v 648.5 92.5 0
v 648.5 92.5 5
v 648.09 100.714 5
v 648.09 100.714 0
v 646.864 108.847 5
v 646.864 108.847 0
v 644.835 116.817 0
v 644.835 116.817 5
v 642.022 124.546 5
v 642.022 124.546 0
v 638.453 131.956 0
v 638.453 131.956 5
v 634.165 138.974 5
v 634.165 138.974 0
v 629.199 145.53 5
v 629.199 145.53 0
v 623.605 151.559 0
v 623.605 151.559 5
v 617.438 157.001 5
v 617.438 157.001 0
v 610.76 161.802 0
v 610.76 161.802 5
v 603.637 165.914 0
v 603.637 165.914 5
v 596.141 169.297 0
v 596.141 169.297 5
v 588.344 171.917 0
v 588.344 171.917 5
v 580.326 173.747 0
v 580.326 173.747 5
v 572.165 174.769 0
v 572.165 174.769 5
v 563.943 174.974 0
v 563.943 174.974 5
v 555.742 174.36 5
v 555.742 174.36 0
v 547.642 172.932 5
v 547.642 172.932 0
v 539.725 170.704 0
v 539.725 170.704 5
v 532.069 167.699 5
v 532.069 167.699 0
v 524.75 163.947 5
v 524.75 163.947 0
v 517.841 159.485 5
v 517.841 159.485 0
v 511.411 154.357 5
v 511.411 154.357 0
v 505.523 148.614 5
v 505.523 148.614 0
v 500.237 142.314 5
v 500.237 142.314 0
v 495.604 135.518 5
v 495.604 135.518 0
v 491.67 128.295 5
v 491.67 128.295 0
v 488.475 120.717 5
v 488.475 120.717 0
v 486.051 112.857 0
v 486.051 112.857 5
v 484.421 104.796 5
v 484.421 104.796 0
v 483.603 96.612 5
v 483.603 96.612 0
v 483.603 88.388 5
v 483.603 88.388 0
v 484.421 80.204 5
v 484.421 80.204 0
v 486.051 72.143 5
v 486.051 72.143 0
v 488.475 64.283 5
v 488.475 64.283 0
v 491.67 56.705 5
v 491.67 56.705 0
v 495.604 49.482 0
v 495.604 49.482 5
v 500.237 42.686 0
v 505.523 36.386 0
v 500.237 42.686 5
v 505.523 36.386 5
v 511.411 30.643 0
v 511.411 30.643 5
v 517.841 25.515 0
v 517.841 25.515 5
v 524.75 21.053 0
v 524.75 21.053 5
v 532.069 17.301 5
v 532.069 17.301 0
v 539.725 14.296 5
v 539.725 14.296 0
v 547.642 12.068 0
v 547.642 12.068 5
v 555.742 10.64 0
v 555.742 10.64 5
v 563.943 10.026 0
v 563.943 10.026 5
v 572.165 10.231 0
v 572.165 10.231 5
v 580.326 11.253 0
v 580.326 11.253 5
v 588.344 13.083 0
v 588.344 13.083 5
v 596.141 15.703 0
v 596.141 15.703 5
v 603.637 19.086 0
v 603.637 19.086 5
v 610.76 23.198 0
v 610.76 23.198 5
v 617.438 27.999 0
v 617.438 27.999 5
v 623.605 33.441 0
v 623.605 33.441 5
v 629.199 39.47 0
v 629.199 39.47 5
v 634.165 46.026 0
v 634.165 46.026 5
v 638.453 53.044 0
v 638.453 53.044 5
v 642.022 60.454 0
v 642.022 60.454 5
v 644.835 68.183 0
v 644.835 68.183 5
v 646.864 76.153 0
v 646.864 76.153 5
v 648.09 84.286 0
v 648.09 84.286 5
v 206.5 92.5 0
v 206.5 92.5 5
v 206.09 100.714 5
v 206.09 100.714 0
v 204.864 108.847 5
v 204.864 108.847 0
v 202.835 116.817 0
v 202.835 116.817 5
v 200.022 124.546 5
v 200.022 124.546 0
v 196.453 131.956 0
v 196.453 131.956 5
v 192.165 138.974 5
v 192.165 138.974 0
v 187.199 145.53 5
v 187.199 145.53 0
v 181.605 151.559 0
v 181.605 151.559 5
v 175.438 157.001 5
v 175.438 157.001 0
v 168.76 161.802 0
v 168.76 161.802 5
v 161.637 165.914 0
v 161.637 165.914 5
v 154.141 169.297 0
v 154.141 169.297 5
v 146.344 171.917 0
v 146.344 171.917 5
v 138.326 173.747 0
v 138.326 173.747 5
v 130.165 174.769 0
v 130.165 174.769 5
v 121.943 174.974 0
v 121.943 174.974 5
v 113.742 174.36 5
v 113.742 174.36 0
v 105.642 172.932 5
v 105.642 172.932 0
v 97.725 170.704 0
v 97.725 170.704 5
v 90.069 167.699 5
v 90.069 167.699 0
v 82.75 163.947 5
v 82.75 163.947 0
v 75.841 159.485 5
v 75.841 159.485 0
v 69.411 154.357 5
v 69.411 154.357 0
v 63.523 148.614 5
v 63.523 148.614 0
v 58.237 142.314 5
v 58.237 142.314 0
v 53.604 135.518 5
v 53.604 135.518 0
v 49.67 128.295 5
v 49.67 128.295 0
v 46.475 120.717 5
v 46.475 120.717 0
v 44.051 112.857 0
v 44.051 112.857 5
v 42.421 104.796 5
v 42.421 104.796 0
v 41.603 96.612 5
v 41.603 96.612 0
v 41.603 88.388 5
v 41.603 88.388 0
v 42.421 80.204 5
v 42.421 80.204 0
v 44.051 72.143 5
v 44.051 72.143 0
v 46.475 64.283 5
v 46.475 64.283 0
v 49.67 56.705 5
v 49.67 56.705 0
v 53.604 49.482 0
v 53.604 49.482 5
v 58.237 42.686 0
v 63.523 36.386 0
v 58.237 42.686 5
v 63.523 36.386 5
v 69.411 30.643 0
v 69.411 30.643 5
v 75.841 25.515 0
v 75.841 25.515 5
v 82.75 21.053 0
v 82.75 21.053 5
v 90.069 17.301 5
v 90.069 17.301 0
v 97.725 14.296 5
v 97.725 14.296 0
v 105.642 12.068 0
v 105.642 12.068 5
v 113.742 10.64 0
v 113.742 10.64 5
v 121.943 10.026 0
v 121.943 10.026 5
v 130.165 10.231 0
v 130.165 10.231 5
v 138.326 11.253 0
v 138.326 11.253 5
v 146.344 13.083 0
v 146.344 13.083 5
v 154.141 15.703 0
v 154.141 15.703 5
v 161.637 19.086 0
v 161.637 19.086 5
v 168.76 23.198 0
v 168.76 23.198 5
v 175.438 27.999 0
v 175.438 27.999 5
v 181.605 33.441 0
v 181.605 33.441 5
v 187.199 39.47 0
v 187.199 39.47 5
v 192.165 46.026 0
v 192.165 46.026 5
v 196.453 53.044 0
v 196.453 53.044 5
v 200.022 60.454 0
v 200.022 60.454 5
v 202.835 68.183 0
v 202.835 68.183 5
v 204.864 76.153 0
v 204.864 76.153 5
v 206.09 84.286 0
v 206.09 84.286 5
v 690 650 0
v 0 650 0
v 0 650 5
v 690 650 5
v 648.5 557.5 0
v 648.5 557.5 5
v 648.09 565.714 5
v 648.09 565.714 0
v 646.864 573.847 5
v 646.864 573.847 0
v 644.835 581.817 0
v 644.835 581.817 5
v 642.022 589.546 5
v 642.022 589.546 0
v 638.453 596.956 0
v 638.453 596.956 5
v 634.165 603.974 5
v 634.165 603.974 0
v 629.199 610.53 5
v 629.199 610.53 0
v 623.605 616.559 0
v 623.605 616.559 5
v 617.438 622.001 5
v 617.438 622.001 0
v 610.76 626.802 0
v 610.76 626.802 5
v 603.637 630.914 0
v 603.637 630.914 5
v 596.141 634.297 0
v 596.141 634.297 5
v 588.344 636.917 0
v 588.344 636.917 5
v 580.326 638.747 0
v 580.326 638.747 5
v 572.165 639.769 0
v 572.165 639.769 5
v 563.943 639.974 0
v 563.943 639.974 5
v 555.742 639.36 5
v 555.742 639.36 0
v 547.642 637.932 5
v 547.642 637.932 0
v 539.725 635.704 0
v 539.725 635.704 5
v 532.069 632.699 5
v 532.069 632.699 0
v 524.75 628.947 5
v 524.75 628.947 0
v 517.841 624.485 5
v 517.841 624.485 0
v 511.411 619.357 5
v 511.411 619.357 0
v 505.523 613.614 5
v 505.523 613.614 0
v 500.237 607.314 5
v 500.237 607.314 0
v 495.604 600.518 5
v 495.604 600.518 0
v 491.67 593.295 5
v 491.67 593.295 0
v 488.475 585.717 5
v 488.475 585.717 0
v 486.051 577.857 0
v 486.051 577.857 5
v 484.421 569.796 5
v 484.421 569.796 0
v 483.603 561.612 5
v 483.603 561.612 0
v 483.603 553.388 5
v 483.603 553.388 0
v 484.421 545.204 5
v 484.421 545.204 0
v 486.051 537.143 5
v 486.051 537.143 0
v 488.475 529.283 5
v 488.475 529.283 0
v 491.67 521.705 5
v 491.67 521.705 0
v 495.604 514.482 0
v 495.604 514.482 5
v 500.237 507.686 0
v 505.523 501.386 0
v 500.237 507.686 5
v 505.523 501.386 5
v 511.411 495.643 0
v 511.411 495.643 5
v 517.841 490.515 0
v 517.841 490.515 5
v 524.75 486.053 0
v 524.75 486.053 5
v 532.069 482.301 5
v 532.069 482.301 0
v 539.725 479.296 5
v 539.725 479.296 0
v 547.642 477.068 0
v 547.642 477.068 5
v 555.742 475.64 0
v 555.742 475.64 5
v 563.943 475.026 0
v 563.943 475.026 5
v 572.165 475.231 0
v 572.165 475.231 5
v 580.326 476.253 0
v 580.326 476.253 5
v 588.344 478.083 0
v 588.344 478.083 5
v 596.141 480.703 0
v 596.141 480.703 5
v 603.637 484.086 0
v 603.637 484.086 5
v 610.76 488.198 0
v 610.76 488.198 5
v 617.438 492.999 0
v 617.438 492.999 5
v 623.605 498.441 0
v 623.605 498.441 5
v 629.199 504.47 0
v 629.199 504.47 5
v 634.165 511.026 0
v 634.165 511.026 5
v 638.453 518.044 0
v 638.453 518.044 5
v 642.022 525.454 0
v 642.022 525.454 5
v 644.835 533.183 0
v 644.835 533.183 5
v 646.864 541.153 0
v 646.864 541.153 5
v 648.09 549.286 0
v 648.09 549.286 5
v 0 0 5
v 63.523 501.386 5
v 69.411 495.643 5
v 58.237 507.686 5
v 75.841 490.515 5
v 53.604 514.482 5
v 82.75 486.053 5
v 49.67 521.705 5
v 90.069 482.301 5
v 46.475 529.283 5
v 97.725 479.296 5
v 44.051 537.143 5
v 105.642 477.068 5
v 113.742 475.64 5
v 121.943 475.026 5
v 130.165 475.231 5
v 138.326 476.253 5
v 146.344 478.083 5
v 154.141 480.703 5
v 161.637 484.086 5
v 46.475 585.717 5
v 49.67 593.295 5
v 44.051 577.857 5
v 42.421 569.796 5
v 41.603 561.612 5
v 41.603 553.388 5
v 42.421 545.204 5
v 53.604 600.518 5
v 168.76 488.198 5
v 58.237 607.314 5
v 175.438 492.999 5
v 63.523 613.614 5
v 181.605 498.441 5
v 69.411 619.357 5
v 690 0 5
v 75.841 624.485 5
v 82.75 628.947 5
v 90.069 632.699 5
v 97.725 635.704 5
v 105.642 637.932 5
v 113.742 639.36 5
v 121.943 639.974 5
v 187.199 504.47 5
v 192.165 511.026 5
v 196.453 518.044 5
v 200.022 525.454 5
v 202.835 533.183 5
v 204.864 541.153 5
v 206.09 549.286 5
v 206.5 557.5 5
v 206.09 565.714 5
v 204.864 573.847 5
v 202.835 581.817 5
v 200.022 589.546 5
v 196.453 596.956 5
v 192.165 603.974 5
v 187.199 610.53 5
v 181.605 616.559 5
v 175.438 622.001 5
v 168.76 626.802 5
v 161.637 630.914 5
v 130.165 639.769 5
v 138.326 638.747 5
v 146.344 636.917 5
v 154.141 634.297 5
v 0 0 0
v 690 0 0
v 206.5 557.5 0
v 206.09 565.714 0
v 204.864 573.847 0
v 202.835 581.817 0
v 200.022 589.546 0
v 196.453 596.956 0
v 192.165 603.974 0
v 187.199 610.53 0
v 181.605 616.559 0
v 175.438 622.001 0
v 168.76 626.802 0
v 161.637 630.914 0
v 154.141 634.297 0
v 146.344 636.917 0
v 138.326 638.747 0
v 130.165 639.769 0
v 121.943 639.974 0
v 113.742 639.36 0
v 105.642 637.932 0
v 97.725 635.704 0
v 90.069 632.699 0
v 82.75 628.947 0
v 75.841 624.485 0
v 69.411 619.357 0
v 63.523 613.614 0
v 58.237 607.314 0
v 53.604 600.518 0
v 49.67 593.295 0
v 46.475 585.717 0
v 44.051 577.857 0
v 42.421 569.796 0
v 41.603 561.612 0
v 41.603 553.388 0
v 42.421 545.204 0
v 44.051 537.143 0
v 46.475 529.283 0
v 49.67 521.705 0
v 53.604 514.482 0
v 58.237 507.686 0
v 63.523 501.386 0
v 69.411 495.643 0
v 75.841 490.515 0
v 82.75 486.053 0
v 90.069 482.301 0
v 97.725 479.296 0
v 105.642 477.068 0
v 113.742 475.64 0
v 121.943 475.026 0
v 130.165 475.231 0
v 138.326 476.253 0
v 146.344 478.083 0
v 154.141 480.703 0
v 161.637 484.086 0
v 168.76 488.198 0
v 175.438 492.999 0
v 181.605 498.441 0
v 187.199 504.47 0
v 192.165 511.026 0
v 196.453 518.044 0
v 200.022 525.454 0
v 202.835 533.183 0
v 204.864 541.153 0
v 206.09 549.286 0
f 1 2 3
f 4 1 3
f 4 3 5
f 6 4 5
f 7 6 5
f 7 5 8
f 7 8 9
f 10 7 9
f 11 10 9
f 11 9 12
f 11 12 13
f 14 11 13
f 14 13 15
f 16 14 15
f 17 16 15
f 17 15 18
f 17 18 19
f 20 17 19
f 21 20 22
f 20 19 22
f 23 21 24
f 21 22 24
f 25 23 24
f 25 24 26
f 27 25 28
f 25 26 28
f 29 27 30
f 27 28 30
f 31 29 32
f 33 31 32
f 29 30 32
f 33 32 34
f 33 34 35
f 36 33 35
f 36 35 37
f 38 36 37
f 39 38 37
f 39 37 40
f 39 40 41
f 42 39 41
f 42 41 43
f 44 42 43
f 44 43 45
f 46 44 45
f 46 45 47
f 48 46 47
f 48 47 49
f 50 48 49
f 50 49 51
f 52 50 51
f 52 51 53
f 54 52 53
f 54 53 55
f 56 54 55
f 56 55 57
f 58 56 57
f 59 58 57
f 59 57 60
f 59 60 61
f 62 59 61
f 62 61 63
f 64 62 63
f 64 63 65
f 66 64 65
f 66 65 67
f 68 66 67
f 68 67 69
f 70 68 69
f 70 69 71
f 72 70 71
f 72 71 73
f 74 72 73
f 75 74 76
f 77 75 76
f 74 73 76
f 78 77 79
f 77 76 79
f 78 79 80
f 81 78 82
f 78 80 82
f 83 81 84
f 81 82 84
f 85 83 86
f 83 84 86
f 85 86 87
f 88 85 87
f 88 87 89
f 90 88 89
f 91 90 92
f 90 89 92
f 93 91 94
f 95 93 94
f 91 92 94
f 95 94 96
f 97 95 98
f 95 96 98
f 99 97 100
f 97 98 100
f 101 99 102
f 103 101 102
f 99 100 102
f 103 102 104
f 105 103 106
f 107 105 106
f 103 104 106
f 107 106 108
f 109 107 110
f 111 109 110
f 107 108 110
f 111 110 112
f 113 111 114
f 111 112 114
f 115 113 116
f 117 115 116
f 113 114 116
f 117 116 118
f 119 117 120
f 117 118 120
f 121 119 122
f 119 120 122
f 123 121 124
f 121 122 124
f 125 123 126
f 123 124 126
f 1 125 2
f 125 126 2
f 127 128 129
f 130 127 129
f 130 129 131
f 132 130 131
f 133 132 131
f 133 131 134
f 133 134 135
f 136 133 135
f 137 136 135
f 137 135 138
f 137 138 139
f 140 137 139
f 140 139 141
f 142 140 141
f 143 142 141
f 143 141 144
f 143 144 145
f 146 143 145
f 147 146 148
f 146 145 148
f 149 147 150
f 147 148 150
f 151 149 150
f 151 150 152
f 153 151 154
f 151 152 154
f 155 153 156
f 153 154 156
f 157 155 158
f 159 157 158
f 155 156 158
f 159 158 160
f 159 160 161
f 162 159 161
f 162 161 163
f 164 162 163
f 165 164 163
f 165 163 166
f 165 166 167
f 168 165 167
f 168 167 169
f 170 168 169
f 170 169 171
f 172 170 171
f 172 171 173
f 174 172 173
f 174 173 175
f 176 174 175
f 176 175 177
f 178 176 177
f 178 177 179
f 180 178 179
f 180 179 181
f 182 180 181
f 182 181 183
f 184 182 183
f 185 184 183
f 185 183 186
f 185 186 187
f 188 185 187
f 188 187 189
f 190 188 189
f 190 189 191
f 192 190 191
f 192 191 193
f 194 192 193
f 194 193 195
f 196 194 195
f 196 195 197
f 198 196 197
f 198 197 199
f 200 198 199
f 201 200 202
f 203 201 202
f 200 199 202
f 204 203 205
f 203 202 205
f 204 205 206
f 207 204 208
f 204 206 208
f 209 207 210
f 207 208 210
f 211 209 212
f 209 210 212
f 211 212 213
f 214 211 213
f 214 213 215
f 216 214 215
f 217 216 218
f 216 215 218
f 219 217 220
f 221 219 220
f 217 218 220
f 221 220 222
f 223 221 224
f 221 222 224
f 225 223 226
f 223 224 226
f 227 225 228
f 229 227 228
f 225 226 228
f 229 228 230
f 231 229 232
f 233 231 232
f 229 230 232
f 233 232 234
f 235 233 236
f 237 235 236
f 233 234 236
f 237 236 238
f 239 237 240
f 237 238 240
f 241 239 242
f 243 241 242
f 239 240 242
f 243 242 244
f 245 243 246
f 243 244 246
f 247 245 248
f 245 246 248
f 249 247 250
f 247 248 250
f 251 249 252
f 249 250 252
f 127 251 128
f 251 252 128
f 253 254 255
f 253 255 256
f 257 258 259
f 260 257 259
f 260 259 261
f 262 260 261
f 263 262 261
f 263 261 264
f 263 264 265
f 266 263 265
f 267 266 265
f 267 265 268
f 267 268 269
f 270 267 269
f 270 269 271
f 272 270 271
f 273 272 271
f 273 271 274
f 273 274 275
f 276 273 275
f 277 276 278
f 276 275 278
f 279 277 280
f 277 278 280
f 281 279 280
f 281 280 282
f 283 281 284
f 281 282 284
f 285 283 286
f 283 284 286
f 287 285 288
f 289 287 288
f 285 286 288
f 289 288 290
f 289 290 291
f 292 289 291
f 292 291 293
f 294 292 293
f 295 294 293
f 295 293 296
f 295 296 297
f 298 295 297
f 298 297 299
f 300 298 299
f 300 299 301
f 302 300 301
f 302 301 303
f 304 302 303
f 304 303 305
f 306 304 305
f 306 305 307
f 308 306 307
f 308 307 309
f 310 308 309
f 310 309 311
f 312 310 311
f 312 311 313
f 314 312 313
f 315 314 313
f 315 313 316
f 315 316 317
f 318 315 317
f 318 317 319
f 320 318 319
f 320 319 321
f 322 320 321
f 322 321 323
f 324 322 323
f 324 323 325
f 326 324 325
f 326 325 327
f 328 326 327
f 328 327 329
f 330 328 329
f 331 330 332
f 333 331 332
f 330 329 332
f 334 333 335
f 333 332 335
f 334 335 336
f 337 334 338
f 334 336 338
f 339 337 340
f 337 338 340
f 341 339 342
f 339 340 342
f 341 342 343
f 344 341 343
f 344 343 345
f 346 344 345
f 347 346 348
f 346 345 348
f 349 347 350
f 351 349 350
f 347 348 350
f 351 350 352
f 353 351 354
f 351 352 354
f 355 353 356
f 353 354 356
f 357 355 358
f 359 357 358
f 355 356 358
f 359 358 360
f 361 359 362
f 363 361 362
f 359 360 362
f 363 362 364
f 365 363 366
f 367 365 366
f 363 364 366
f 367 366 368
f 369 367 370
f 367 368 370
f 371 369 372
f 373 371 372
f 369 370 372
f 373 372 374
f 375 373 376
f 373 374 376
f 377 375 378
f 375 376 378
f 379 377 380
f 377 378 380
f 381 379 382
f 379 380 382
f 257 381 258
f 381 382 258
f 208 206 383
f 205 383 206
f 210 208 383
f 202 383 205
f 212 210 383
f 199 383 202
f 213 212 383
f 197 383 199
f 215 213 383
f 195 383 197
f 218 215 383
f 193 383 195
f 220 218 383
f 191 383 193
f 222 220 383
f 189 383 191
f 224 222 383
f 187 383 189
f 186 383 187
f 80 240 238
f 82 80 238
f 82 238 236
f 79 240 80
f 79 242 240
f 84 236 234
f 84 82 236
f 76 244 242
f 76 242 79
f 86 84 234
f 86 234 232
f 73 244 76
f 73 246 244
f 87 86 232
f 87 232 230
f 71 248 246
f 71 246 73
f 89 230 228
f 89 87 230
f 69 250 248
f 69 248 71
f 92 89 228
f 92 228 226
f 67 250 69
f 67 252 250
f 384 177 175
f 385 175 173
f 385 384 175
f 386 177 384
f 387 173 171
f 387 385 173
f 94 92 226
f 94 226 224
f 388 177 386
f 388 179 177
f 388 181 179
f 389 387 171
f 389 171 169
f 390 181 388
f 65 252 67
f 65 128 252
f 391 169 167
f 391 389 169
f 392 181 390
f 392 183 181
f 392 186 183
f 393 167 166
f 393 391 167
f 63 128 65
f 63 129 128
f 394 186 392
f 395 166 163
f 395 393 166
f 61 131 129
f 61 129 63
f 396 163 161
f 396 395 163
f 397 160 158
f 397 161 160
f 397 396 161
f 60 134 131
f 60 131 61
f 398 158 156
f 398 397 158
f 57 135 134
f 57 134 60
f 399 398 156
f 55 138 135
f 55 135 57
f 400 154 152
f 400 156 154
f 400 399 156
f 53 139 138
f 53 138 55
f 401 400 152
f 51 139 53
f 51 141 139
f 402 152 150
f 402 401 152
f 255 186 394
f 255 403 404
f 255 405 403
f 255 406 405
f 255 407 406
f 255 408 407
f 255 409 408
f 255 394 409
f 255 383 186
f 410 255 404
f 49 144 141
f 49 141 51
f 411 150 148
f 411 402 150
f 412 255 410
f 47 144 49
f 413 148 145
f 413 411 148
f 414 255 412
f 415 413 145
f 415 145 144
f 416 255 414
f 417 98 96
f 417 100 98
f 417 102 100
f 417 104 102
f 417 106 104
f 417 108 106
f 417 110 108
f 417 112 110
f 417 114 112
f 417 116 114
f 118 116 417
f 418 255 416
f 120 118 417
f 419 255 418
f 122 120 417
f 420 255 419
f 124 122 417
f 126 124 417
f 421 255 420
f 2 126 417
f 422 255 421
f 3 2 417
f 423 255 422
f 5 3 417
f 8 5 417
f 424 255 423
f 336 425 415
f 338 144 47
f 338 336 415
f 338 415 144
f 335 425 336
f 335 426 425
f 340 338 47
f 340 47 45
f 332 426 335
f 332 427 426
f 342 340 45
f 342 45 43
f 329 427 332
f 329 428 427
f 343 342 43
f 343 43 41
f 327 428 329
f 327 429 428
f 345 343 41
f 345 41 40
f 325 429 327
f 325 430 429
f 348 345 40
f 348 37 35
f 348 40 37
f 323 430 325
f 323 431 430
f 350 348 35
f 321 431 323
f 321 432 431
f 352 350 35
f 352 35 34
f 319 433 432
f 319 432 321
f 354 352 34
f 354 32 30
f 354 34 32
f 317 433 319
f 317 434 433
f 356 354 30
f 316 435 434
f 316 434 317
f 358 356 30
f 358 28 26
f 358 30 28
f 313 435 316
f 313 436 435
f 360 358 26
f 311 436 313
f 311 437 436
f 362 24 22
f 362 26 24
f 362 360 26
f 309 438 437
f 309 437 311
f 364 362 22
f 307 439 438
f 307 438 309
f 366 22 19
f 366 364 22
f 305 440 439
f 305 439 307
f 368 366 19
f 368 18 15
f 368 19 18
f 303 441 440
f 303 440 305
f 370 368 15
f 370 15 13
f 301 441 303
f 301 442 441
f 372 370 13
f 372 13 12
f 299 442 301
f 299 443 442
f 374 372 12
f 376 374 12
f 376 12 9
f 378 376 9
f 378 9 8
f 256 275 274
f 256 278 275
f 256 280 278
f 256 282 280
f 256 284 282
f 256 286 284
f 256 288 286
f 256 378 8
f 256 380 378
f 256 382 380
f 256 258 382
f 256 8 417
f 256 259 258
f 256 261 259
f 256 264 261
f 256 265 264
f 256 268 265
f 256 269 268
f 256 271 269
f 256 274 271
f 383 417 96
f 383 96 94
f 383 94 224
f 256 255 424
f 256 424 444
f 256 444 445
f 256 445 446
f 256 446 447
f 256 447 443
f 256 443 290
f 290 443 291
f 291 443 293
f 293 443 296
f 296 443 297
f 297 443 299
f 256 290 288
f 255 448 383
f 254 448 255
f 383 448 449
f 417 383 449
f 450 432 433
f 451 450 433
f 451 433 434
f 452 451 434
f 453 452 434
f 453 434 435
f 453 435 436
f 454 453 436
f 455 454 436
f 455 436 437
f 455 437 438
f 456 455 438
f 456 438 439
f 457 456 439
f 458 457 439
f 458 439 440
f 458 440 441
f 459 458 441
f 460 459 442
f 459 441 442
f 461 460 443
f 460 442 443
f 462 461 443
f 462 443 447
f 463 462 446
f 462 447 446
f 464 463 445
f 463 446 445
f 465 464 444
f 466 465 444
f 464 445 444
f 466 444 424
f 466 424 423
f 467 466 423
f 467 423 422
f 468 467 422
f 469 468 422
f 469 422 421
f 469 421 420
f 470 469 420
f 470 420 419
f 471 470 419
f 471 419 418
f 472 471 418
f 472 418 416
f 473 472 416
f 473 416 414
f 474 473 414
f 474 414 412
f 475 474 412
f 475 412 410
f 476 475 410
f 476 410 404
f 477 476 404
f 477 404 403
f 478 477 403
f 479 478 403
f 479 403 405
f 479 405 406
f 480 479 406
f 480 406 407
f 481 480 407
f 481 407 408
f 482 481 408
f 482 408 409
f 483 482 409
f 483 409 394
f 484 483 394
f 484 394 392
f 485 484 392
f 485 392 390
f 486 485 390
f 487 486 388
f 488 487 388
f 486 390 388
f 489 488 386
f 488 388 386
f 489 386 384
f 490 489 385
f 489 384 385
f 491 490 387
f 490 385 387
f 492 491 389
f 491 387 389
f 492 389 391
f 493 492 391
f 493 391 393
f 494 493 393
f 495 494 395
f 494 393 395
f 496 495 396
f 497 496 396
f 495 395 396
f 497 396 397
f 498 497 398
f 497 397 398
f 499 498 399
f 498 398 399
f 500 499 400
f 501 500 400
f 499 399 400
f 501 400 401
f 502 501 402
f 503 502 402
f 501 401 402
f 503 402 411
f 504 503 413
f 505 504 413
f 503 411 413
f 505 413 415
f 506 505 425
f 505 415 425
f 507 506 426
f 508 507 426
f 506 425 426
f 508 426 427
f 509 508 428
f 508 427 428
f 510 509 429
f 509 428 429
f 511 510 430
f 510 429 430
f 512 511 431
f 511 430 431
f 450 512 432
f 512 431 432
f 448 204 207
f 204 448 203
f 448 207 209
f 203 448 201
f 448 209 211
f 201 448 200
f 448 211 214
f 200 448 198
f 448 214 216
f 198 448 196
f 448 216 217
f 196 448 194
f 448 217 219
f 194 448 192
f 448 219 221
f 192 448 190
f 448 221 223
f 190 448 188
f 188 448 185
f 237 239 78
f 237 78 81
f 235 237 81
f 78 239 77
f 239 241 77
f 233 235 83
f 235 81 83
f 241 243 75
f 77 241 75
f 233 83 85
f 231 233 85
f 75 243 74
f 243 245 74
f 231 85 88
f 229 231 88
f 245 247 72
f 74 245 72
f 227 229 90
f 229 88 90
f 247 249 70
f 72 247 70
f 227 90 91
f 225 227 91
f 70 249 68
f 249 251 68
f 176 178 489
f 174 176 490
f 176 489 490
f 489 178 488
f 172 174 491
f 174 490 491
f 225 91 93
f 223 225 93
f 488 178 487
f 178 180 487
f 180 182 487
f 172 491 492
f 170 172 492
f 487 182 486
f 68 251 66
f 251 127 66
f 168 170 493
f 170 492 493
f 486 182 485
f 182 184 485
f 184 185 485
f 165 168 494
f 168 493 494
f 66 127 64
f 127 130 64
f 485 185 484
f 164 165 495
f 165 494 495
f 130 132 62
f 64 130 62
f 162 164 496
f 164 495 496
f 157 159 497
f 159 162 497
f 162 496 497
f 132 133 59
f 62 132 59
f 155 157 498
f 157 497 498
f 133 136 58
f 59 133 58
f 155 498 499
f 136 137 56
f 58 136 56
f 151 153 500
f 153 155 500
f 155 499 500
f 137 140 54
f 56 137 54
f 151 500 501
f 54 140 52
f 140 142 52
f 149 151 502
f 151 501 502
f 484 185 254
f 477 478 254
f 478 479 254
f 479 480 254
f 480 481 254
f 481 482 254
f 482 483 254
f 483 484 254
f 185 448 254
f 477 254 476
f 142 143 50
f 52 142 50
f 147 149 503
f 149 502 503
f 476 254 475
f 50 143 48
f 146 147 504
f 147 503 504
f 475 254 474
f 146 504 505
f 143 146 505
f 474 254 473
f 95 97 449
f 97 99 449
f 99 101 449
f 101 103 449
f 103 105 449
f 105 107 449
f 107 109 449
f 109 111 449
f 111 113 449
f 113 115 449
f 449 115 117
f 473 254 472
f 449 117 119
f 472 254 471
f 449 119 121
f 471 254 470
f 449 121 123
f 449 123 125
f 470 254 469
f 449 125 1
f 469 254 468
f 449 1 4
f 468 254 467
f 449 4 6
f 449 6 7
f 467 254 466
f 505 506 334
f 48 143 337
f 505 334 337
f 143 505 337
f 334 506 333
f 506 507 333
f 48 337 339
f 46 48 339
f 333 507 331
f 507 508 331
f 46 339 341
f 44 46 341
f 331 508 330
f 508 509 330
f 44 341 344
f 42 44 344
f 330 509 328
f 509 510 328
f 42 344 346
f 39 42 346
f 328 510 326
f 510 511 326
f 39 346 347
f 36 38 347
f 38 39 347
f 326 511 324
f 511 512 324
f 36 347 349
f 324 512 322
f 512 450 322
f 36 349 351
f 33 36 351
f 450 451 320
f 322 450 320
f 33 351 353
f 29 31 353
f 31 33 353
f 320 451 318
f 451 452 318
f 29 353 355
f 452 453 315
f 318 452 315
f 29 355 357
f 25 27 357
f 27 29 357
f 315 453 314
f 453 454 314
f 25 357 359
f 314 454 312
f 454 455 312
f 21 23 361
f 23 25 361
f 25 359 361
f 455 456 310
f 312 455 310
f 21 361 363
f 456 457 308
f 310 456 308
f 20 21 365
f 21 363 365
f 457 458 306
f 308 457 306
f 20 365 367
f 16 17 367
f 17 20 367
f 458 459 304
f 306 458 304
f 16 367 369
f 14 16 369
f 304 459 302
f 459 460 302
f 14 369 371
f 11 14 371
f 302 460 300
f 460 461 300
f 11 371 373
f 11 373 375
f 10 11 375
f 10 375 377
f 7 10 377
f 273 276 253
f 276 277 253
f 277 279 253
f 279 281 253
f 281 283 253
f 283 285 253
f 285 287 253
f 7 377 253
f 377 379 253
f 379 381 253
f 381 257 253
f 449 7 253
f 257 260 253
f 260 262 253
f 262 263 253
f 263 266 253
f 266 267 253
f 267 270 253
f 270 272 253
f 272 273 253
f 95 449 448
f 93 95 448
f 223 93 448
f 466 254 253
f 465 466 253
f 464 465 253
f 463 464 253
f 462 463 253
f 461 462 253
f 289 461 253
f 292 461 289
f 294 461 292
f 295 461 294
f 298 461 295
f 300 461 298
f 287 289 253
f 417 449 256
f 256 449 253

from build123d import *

# Parameters (mm, degrees)
SKETCH_1_W           = 690
SKETCH_1_H           = 650
BOTTOM_PLATE_DEPTH   = 5
SKETCH_2_R           = 82.5
GRAB_CLEARANCE_DEPTH = 948.958332418
SKETCH_3_R           = 82.5
CUT_EXTRUDE_2_DEPTH  = 948.958332418
SKETCH_4_R           = 82.5
CUT_EXTRUDE_3_DEPTH  = 948.958332418
SKETCH_5_R           = 82.5
CUT_EXTRUDE_4_DEPTH  = 948.958332418


with BuildPart() as part:
    # 草图1 → Bottom_plate (new body)
    with BuildSketch(Plane.XY):
        with Locations((345, 325)):
            Rectangle(SKETCH_1_W, SKETCH_1_H)
    extrude(amount=BOTTOM_PLATE_DEPTH)

    # 草图2 → Grab_clearance (cut, through all)
    with BuildSketch(Plane.XY.offset(5)):
        with Locations((124, 92.5)):
            Circle(SKETCH_2_R)
    extrude(amount=-GRAB_CLEARANCE_DEPTH, mode=Mode.SUBTRACT)

    # 草图3 → 切除-拉伸2 (cut, through all)
    with BuildSketch(Plane.XY.offset(5)):
        with Locations((124, 557.5)):
            Circle(SKETCH_3_R)
    extrude(amount=-CUT_EXTRUDE_2_DEPTH, mode=Mode.SUBTRACT)

    # 草图4 → 切除-拉伸3 (cut, through all)
    with BuildSketch(Plane.XY.offset(5)):
        with Locations((566, 92.5)):
            Circle(SKETCH_4_R)
    extrude(amount=-CUT_EXTRUDE_3_DEPTH, mode=Mode.SUBTRACT)

    # 草图5 → 切除-拉伸4 (cut, through all)
    with BuildSketch(Plane.XY.offset(5)):
        with Locations((566, 557.5)):
            Circle(SKETCH_5_R)
    extrude(amount=-CUT_EXTRUDE_4_DEPTH, mode=Mode.SUBTRACT)


solid = part.part
